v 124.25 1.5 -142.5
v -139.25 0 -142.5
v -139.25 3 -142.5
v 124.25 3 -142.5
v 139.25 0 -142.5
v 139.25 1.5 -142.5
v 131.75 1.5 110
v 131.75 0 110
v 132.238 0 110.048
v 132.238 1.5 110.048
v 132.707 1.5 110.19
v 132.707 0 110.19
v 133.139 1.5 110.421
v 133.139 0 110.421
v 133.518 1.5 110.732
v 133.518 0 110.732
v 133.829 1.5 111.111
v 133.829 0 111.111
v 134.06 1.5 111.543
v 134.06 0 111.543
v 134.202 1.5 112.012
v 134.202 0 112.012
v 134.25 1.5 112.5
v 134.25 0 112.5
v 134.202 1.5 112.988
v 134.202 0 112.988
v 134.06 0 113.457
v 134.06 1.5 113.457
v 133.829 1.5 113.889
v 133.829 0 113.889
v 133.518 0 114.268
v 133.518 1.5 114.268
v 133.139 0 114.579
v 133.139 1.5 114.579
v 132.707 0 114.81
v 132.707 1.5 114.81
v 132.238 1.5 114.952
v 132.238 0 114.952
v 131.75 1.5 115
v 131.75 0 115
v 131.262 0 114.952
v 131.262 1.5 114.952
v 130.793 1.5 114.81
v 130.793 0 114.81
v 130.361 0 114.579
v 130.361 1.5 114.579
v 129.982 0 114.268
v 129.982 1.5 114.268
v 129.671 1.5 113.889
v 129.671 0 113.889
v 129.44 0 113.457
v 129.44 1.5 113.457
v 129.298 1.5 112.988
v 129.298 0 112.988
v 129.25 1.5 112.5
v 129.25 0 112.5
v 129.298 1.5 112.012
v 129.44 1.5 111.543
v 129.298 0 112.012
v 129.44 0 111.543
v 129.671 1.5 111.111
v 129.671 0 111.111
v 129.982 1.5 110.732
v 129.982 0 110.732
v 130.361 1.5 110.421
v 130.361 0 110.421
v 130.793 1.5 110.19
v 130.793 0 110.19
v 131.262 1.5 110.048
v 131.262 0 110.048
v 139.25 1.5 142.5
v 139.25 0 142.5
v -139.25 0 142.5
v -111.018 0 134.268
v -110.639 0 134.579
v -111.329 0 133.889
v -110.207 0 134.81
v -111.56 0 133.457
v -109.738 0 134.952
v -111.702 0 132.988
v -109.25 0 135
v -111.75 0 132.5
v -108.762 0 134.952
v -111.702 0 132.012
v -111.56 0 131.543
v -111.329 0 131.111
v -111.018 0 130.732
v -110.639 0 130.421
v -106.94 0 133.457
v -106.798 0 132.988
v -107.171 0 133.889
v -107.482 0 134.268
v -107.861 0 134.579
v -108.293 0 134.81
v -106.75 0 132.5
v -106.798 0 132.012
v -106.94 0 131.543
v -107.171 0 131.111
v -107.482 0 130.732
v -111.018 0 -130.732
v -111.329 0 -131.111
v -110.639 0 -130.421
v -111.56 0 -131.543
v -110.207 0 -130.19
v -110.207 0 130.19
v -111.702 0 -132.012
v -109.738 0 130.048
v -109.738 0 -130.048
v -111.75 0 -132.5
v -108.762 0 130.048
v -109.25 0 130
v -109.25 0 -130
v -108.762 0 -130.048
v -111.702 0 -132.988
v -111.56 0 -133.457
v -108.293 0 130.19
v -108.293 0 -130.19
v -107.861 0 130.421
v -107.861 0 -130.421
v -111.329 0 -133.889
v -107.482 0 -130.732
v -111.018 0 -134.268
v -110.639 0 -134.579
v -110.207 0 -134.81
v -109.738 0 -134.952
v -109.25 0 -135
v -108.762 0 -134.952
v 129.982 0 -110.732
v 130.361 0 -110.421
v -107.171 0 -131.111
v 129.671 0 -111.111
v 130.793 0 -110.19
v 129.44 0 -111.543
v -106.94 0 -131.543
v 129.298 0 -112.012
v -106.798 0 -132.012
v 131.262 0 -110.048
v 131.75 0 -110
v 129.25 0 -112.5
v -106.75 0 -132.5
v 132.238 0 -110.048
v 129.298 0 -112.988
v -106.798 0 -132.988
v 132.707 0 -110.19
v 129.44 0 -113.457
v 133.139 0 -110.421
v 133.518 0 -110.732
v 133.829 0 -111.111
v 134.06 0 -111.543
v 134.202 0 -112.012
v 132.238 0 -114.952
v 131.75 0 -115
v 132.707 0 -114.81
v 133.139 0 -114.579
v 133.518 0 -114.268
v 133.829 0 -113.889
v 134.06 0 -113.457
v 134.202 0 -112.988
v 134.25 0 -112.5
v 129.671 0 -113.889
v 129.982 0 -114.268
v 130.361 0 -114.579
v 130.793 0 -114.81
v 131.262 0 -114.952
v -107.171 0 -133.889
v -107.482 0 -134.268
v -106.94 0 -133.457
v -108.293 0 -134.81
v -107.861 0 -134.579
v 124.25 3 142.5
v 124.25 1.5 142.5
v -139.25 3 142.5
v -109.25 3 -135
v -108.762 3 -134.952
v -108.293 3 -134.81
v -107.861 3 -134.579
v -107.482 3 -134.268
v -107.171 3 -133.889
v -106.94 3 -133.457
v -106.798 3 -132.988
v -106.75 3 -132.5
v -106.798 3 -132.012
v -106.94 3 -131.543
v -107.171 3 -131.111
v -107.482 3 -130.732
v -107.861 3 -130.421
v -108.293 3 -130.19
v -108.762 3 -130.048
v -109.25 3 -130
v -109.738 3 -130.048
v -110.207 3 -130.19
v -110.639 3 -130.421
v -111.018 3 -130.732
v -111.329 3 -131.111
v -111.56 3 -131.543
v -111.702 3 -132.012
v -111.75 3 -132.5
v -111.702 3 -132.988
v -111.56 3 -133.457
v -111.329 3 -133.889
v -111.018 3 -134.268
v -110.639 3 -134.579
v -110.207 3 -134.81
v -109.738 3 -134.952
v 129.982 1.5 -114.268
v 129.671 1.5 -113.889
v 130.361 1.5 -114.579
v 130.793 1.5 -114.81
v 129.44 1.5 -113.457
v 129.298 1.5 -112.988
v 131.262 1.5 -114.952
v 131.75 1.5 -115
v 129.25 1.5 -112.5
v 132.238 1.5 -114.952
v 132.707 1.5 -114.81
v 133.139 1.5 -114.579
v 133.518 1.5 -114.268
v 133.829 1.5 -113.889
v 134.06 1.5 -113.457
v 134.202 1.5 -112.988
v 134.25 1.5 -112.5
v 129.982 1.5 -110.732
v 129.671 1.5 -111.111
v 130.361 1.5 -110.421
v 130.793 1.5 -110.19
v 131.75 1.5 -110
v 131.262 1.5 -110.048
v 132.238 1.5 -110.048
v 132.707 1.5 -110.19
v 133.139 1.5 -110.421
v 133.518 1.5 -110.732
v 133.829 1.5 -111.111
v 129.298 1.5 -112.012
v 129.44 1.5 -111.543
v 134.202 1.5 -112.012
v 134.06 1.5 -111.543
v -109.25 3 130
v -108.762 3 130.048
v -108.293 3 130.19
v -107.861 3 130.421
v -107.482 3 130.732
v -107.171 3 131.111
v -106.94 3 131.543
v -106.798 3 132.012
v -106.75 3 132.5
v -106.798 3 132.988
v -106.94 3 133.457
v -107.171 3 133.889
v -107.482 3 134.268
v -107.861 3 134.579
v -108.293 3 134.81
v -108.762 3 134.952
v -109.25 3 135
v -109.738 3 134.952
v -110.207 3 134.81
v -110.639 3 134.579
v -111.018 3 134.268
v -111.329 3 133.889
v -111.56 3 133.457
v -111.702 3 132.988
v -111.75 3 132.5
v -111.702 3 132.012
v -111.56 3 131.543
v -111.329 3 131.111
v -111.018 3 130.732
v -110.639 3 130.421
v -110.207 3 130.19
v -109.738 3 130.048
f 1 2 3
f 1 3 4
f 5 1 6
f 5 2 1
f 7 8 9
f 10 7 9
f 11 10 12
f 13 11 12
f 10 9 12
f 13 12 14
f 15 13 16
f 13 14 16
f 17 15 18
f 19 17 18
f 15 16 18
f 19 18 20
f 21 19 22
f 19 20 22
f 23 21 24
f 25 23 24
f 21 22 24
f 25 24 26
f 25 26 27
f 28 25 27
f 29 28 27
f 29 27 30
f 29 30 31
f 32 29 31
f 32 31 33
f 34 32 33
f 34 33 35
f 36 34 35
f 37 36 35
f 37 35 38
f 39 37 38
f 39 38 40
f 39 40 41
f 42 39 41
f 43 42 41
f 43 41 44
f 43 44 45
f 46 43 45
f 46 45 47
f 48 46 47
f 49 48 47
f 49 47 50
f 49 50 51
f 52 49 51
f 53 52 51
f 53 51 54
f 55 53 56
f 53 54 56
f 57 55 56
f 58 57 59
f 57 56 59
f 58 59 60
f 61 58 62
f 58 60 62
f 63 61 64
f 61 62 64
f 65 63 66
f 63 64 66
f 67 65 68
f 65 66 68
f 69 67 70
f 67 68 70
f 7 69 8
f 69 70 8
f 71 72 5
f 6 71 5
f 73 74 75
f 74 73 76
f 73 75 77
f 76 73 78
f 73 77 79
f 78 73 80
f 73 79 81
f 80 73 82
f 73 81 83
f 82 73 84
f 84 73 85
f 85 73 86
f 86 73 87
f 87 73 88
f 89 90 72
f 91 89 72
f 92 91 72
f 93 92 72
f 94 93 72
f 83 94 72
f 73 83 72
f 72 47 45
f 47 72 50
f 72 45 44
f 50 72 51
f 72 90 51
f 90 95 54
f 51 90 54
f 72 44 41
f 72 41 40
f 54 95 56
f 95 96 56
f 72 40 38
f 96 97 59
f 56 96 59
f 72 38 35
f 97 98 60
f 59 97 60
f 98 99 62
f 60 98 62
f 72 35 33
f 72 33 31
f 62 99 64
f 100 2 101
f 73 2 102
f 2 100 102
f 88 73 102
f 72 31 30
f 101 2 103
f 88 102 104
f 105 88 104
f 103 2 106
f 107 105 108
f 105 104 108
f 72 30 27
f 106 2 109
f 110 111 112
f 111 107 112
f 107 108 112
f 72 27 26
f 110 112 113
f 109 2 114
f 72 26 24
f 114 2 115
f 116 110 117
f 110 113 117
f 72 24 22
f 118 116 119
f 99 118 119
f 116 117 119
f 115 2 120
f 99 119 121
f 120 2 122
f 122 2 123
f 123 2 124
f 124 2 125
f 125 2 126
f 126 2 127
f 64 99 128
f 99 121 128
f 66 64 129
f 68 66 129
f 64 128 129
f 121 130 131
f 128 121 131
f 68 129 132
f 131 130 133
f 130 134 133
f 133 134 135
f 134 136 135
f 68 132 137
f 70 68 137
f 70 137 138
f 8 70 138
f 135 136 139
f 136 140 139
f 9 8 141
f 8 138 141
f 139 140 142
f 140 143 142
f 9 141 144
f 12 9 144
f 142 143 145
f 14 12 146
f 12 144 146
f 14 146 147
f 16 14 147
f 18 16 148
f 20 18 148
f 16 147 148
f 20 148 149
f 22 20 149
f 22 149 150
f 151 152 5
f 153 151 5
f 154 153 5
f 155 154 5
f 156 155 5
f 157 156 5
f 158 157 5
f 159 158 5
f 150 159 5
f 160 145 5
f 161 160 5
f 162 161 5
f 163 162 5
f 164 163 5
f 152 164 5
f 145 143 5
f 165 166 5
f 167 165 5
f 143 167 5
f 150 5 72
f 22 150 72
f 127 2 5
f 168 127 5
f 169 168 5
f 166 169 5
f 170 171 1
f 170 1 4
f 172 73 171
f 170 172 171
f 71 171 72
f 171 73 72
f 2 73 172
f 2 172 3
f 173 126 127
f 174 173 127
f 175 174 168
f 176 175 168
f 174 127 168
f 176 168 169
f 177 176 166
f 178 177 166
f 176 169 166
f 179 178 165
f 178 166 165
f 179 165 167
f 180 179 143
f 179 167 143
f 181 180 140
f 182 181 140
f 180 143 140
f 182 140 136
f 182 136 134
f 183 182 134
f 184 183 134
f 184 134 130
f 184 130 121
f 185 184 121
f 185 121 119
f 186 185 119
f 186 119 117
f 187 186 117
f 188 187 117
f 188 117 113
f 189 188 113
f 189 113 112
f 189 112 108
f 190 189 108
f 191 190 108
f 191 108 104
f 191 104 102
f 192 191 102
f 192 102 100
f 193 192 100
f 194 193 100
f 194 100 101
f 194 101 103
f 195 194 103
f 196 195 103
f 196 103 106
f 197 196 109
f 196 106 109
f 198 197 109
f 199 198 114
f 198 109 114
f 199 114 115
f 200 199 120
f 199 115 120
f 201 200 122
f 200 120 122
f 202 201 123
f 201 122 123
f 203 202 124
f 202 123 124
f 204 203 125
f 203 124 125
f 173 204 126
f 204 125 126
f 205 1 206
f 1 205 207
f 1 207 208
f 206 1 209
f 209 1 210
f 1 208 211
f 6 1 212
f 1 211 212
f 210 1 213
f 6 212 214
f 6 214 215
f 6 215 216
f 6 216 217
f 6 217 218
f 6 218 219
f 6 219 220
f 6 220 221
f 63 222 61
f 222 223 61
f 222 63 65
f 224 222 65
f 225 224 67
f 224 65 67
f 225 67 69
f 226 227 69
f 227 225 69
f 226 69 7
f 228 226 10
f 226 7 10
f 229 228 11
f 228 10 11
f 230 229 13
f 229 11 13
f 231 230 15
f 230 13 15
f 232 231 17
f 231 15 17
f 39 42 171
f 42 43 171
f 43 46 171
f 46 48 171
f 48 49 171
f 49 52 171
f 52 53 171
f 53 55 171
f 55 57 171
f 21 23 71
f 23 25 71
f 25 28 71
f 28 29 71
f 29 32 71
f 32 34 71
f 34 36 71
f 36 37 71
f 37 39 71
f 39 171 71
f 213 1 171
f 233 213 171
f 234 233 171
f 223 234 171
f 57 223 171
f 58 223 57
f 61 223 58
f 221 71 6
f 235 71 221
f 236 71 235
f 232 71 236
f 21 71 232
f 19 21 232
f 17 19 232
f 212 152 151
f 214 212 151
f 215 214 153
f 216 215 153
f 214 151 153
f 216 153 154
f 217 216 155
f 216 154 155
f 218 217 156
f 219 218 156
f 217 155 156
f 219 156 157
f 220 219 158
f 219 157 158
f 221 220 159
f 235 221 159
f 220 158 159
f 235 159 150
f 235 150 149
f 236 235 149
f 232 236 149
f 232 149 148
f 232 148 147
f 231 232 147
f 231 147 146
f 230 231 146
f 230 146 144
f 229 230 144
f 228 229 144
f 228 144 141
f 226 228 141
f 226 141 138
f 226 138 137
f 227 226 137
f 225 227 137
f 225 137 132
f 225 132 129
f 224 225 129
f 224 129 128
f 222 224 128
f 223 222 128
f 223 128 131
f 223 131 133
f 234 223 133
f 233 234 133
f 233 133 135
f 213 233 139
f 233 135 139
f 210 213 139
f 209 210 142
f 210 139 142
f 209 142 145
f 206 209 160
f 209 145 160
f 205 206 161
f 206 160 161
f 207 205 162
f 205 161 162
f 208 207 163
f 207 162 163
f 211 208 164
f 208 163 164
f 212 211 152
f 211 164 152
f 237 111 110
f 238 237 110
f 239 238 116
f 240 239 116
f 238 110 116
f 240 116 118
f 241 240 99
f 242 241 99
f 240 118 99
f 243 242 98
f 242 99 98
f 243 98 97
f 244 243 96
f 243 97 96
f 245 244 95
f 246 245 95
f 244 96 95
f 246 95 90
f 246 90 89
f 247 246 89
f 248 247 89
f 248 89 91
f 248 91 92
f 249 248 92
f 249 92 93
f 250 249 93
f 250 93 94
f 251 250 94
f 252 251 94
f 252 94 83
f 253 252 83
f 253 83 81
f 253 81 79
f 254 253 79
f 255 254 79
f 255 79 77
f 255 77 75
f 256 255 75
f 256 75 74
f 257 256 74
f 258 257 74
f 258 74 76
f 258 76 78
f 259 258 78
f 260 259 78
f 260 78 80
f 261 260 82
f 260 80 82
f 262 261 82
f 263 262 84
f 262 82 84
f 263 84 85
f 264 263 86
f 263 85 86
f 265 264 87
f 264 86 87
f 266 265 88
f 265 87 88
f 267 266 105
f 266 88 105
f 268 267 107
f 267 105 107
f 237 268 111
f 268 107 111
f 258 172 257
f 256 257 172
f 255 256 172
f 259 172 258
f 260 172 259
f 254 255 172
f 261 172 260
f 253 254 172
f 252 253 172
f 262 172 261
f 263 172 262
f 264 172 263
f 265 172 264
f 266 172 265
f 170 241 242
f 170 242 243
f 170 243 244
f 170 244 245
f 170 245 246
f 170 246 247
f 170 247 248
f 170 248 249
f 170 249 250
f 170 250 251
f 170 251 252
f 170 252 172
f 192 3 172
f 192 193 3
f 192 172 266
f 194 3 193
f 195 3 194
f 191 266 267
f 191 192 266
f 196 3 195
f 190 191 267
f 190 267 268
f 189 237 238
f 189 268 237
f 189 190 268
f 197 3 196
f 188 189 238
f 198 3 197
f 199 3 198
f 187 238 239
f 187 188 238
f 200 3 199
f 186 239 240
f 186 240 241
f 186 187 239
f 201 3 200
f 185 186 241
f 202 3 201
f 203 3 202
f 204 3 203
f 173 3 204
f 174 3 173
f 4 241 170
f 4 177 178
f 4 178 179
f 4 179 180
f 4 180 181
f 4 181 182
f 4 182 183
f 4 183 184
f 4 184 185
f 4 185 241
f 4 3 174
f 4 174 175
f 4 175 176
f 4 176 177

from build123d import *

# Parameters (mm, degrees)
SKETCH1_W           = 278.5
SKETCH1_H           = 285
BOSS_EXTRUDE1_DEPTH = 3
SKETCH2_W           = 15
SKETCH2_H           = 1.5
CUT_EXTRUDE1_DEPTH  = 318.213748914
CUT_EXTRUDE3_REACH  = 201.263
SKETCH4_R           = 2.5
CUT_EXTRUDE4_REACH  = 201.263
SKETCH5_R           = 2.5


with BuildPart() as part:
    # Sketch1 → Boss-Extrude1 (new body)
    with BuildSketch(Plane(origin=(0, 0, 0), x_dir=(1, 0, 0), z_dir=(0, 1, 0))):
        Rectangle(SKETCH1_W, SKETCH1_H)
    extrude(amount=BOSS_EXTRUDE1_DEPTH)

    # Sketch2 → Cut-Extrude1 (cut, through all)
    with BuildSketch(Plane.XY.offset(142.5)):
        with Locations((131.75, 2.25)):
            Rectangle(SKETCH2_W, SKETCH2_H)
    extrude(amount=-CUT_EXTRUDE1_DEPTH, mode=Mode.SUBTRACT)

    # Sketch4 → Cut-Extrude3 (cut, up to next)
    with BuildSketch(Plane.XZ, mode=Mode.PRIVATE) as cut_extrude3_sk1:
        with Locations(Location((-109.25, -132.5, 0), (0, 0, 270))):
            Circle(SKETCH4_R)
    cut_extrude3_tool1 = extrude(cut_extrude3_sk1.sketch, amount=-CUT_EXTRUDE3_REACH, mode=Mode.PRIVATE) & part.part
    # Sketch4 → Cut-Extrude3 (cut, up to next)
    with BuildSketch(Plane.XZ, mode=Mode.PRIVATE) as cut_extrude3_sk2:
        with Locations(Location((-109.25, 132.5, 0), (0, 0, 270))):
            Circle(SKETCH4_R)
    cut_extrude3_tool2 = extrude(cut_extrude3_sk2.sketch, amount=-CUT_EXTRUDE3_REACH, mode=Mode.PRIVATE) & part.part
    add(cut_extrude3_tool1.solids().sort_by_distance((-109.25, 0, -132.5))[0], mode=Mode.SUBTRACT)
    add(cut_extrude3_tool2.solids().sort_by_distance((-109.25, 0, 132.5))[0], mode=Mode.SUBTRACT)

    # Sketch5 → Cut-Extrude4 (cut, up to next)
    with BuildSketch(Plane.XZ, mode=Mode.PRIVATE) as cut_extrude4_sk1:
        with Locations(Location((131.75, -112.5, 0), (0, 0, 270))):
            Circle(SKETCH5_R)
    cut_extrude4_tool1 = extrude(cut_extrude4_sk1.sketch, amount=-CUT_EXTRUDE4_REACH, mode=Mode.PRIVATE) & part.part
    # Sketch5 → Cut-Extrude4 (cut, up to next)
    with BuildSketch(Plane.XZ, mode=Mode.PRIVATE) as cut_extrude4_sk2:
        with Locations(Location((131.75, 112.5, 0), (0, 0, 270))):
            Circle(SKETCH5_R)
    cut_extrude4_tool2 = extrude(cut_extrude4_sk2.sketch, amount=-CUT_EXTRUDE4_REACH, mode=Mode.PRIVATE) & part.part
    add(cut_extrude4_tool1.solids().sort_by_distance((131.75, 0, -112.5))[0], mode=Mode.SUBTRACT)
    add(cut_extrude4_tool2.solids().sort_by_distance((131.75, 0, 112.5))[0], mode=Mode.SUBTRACT)


solid = part.part
